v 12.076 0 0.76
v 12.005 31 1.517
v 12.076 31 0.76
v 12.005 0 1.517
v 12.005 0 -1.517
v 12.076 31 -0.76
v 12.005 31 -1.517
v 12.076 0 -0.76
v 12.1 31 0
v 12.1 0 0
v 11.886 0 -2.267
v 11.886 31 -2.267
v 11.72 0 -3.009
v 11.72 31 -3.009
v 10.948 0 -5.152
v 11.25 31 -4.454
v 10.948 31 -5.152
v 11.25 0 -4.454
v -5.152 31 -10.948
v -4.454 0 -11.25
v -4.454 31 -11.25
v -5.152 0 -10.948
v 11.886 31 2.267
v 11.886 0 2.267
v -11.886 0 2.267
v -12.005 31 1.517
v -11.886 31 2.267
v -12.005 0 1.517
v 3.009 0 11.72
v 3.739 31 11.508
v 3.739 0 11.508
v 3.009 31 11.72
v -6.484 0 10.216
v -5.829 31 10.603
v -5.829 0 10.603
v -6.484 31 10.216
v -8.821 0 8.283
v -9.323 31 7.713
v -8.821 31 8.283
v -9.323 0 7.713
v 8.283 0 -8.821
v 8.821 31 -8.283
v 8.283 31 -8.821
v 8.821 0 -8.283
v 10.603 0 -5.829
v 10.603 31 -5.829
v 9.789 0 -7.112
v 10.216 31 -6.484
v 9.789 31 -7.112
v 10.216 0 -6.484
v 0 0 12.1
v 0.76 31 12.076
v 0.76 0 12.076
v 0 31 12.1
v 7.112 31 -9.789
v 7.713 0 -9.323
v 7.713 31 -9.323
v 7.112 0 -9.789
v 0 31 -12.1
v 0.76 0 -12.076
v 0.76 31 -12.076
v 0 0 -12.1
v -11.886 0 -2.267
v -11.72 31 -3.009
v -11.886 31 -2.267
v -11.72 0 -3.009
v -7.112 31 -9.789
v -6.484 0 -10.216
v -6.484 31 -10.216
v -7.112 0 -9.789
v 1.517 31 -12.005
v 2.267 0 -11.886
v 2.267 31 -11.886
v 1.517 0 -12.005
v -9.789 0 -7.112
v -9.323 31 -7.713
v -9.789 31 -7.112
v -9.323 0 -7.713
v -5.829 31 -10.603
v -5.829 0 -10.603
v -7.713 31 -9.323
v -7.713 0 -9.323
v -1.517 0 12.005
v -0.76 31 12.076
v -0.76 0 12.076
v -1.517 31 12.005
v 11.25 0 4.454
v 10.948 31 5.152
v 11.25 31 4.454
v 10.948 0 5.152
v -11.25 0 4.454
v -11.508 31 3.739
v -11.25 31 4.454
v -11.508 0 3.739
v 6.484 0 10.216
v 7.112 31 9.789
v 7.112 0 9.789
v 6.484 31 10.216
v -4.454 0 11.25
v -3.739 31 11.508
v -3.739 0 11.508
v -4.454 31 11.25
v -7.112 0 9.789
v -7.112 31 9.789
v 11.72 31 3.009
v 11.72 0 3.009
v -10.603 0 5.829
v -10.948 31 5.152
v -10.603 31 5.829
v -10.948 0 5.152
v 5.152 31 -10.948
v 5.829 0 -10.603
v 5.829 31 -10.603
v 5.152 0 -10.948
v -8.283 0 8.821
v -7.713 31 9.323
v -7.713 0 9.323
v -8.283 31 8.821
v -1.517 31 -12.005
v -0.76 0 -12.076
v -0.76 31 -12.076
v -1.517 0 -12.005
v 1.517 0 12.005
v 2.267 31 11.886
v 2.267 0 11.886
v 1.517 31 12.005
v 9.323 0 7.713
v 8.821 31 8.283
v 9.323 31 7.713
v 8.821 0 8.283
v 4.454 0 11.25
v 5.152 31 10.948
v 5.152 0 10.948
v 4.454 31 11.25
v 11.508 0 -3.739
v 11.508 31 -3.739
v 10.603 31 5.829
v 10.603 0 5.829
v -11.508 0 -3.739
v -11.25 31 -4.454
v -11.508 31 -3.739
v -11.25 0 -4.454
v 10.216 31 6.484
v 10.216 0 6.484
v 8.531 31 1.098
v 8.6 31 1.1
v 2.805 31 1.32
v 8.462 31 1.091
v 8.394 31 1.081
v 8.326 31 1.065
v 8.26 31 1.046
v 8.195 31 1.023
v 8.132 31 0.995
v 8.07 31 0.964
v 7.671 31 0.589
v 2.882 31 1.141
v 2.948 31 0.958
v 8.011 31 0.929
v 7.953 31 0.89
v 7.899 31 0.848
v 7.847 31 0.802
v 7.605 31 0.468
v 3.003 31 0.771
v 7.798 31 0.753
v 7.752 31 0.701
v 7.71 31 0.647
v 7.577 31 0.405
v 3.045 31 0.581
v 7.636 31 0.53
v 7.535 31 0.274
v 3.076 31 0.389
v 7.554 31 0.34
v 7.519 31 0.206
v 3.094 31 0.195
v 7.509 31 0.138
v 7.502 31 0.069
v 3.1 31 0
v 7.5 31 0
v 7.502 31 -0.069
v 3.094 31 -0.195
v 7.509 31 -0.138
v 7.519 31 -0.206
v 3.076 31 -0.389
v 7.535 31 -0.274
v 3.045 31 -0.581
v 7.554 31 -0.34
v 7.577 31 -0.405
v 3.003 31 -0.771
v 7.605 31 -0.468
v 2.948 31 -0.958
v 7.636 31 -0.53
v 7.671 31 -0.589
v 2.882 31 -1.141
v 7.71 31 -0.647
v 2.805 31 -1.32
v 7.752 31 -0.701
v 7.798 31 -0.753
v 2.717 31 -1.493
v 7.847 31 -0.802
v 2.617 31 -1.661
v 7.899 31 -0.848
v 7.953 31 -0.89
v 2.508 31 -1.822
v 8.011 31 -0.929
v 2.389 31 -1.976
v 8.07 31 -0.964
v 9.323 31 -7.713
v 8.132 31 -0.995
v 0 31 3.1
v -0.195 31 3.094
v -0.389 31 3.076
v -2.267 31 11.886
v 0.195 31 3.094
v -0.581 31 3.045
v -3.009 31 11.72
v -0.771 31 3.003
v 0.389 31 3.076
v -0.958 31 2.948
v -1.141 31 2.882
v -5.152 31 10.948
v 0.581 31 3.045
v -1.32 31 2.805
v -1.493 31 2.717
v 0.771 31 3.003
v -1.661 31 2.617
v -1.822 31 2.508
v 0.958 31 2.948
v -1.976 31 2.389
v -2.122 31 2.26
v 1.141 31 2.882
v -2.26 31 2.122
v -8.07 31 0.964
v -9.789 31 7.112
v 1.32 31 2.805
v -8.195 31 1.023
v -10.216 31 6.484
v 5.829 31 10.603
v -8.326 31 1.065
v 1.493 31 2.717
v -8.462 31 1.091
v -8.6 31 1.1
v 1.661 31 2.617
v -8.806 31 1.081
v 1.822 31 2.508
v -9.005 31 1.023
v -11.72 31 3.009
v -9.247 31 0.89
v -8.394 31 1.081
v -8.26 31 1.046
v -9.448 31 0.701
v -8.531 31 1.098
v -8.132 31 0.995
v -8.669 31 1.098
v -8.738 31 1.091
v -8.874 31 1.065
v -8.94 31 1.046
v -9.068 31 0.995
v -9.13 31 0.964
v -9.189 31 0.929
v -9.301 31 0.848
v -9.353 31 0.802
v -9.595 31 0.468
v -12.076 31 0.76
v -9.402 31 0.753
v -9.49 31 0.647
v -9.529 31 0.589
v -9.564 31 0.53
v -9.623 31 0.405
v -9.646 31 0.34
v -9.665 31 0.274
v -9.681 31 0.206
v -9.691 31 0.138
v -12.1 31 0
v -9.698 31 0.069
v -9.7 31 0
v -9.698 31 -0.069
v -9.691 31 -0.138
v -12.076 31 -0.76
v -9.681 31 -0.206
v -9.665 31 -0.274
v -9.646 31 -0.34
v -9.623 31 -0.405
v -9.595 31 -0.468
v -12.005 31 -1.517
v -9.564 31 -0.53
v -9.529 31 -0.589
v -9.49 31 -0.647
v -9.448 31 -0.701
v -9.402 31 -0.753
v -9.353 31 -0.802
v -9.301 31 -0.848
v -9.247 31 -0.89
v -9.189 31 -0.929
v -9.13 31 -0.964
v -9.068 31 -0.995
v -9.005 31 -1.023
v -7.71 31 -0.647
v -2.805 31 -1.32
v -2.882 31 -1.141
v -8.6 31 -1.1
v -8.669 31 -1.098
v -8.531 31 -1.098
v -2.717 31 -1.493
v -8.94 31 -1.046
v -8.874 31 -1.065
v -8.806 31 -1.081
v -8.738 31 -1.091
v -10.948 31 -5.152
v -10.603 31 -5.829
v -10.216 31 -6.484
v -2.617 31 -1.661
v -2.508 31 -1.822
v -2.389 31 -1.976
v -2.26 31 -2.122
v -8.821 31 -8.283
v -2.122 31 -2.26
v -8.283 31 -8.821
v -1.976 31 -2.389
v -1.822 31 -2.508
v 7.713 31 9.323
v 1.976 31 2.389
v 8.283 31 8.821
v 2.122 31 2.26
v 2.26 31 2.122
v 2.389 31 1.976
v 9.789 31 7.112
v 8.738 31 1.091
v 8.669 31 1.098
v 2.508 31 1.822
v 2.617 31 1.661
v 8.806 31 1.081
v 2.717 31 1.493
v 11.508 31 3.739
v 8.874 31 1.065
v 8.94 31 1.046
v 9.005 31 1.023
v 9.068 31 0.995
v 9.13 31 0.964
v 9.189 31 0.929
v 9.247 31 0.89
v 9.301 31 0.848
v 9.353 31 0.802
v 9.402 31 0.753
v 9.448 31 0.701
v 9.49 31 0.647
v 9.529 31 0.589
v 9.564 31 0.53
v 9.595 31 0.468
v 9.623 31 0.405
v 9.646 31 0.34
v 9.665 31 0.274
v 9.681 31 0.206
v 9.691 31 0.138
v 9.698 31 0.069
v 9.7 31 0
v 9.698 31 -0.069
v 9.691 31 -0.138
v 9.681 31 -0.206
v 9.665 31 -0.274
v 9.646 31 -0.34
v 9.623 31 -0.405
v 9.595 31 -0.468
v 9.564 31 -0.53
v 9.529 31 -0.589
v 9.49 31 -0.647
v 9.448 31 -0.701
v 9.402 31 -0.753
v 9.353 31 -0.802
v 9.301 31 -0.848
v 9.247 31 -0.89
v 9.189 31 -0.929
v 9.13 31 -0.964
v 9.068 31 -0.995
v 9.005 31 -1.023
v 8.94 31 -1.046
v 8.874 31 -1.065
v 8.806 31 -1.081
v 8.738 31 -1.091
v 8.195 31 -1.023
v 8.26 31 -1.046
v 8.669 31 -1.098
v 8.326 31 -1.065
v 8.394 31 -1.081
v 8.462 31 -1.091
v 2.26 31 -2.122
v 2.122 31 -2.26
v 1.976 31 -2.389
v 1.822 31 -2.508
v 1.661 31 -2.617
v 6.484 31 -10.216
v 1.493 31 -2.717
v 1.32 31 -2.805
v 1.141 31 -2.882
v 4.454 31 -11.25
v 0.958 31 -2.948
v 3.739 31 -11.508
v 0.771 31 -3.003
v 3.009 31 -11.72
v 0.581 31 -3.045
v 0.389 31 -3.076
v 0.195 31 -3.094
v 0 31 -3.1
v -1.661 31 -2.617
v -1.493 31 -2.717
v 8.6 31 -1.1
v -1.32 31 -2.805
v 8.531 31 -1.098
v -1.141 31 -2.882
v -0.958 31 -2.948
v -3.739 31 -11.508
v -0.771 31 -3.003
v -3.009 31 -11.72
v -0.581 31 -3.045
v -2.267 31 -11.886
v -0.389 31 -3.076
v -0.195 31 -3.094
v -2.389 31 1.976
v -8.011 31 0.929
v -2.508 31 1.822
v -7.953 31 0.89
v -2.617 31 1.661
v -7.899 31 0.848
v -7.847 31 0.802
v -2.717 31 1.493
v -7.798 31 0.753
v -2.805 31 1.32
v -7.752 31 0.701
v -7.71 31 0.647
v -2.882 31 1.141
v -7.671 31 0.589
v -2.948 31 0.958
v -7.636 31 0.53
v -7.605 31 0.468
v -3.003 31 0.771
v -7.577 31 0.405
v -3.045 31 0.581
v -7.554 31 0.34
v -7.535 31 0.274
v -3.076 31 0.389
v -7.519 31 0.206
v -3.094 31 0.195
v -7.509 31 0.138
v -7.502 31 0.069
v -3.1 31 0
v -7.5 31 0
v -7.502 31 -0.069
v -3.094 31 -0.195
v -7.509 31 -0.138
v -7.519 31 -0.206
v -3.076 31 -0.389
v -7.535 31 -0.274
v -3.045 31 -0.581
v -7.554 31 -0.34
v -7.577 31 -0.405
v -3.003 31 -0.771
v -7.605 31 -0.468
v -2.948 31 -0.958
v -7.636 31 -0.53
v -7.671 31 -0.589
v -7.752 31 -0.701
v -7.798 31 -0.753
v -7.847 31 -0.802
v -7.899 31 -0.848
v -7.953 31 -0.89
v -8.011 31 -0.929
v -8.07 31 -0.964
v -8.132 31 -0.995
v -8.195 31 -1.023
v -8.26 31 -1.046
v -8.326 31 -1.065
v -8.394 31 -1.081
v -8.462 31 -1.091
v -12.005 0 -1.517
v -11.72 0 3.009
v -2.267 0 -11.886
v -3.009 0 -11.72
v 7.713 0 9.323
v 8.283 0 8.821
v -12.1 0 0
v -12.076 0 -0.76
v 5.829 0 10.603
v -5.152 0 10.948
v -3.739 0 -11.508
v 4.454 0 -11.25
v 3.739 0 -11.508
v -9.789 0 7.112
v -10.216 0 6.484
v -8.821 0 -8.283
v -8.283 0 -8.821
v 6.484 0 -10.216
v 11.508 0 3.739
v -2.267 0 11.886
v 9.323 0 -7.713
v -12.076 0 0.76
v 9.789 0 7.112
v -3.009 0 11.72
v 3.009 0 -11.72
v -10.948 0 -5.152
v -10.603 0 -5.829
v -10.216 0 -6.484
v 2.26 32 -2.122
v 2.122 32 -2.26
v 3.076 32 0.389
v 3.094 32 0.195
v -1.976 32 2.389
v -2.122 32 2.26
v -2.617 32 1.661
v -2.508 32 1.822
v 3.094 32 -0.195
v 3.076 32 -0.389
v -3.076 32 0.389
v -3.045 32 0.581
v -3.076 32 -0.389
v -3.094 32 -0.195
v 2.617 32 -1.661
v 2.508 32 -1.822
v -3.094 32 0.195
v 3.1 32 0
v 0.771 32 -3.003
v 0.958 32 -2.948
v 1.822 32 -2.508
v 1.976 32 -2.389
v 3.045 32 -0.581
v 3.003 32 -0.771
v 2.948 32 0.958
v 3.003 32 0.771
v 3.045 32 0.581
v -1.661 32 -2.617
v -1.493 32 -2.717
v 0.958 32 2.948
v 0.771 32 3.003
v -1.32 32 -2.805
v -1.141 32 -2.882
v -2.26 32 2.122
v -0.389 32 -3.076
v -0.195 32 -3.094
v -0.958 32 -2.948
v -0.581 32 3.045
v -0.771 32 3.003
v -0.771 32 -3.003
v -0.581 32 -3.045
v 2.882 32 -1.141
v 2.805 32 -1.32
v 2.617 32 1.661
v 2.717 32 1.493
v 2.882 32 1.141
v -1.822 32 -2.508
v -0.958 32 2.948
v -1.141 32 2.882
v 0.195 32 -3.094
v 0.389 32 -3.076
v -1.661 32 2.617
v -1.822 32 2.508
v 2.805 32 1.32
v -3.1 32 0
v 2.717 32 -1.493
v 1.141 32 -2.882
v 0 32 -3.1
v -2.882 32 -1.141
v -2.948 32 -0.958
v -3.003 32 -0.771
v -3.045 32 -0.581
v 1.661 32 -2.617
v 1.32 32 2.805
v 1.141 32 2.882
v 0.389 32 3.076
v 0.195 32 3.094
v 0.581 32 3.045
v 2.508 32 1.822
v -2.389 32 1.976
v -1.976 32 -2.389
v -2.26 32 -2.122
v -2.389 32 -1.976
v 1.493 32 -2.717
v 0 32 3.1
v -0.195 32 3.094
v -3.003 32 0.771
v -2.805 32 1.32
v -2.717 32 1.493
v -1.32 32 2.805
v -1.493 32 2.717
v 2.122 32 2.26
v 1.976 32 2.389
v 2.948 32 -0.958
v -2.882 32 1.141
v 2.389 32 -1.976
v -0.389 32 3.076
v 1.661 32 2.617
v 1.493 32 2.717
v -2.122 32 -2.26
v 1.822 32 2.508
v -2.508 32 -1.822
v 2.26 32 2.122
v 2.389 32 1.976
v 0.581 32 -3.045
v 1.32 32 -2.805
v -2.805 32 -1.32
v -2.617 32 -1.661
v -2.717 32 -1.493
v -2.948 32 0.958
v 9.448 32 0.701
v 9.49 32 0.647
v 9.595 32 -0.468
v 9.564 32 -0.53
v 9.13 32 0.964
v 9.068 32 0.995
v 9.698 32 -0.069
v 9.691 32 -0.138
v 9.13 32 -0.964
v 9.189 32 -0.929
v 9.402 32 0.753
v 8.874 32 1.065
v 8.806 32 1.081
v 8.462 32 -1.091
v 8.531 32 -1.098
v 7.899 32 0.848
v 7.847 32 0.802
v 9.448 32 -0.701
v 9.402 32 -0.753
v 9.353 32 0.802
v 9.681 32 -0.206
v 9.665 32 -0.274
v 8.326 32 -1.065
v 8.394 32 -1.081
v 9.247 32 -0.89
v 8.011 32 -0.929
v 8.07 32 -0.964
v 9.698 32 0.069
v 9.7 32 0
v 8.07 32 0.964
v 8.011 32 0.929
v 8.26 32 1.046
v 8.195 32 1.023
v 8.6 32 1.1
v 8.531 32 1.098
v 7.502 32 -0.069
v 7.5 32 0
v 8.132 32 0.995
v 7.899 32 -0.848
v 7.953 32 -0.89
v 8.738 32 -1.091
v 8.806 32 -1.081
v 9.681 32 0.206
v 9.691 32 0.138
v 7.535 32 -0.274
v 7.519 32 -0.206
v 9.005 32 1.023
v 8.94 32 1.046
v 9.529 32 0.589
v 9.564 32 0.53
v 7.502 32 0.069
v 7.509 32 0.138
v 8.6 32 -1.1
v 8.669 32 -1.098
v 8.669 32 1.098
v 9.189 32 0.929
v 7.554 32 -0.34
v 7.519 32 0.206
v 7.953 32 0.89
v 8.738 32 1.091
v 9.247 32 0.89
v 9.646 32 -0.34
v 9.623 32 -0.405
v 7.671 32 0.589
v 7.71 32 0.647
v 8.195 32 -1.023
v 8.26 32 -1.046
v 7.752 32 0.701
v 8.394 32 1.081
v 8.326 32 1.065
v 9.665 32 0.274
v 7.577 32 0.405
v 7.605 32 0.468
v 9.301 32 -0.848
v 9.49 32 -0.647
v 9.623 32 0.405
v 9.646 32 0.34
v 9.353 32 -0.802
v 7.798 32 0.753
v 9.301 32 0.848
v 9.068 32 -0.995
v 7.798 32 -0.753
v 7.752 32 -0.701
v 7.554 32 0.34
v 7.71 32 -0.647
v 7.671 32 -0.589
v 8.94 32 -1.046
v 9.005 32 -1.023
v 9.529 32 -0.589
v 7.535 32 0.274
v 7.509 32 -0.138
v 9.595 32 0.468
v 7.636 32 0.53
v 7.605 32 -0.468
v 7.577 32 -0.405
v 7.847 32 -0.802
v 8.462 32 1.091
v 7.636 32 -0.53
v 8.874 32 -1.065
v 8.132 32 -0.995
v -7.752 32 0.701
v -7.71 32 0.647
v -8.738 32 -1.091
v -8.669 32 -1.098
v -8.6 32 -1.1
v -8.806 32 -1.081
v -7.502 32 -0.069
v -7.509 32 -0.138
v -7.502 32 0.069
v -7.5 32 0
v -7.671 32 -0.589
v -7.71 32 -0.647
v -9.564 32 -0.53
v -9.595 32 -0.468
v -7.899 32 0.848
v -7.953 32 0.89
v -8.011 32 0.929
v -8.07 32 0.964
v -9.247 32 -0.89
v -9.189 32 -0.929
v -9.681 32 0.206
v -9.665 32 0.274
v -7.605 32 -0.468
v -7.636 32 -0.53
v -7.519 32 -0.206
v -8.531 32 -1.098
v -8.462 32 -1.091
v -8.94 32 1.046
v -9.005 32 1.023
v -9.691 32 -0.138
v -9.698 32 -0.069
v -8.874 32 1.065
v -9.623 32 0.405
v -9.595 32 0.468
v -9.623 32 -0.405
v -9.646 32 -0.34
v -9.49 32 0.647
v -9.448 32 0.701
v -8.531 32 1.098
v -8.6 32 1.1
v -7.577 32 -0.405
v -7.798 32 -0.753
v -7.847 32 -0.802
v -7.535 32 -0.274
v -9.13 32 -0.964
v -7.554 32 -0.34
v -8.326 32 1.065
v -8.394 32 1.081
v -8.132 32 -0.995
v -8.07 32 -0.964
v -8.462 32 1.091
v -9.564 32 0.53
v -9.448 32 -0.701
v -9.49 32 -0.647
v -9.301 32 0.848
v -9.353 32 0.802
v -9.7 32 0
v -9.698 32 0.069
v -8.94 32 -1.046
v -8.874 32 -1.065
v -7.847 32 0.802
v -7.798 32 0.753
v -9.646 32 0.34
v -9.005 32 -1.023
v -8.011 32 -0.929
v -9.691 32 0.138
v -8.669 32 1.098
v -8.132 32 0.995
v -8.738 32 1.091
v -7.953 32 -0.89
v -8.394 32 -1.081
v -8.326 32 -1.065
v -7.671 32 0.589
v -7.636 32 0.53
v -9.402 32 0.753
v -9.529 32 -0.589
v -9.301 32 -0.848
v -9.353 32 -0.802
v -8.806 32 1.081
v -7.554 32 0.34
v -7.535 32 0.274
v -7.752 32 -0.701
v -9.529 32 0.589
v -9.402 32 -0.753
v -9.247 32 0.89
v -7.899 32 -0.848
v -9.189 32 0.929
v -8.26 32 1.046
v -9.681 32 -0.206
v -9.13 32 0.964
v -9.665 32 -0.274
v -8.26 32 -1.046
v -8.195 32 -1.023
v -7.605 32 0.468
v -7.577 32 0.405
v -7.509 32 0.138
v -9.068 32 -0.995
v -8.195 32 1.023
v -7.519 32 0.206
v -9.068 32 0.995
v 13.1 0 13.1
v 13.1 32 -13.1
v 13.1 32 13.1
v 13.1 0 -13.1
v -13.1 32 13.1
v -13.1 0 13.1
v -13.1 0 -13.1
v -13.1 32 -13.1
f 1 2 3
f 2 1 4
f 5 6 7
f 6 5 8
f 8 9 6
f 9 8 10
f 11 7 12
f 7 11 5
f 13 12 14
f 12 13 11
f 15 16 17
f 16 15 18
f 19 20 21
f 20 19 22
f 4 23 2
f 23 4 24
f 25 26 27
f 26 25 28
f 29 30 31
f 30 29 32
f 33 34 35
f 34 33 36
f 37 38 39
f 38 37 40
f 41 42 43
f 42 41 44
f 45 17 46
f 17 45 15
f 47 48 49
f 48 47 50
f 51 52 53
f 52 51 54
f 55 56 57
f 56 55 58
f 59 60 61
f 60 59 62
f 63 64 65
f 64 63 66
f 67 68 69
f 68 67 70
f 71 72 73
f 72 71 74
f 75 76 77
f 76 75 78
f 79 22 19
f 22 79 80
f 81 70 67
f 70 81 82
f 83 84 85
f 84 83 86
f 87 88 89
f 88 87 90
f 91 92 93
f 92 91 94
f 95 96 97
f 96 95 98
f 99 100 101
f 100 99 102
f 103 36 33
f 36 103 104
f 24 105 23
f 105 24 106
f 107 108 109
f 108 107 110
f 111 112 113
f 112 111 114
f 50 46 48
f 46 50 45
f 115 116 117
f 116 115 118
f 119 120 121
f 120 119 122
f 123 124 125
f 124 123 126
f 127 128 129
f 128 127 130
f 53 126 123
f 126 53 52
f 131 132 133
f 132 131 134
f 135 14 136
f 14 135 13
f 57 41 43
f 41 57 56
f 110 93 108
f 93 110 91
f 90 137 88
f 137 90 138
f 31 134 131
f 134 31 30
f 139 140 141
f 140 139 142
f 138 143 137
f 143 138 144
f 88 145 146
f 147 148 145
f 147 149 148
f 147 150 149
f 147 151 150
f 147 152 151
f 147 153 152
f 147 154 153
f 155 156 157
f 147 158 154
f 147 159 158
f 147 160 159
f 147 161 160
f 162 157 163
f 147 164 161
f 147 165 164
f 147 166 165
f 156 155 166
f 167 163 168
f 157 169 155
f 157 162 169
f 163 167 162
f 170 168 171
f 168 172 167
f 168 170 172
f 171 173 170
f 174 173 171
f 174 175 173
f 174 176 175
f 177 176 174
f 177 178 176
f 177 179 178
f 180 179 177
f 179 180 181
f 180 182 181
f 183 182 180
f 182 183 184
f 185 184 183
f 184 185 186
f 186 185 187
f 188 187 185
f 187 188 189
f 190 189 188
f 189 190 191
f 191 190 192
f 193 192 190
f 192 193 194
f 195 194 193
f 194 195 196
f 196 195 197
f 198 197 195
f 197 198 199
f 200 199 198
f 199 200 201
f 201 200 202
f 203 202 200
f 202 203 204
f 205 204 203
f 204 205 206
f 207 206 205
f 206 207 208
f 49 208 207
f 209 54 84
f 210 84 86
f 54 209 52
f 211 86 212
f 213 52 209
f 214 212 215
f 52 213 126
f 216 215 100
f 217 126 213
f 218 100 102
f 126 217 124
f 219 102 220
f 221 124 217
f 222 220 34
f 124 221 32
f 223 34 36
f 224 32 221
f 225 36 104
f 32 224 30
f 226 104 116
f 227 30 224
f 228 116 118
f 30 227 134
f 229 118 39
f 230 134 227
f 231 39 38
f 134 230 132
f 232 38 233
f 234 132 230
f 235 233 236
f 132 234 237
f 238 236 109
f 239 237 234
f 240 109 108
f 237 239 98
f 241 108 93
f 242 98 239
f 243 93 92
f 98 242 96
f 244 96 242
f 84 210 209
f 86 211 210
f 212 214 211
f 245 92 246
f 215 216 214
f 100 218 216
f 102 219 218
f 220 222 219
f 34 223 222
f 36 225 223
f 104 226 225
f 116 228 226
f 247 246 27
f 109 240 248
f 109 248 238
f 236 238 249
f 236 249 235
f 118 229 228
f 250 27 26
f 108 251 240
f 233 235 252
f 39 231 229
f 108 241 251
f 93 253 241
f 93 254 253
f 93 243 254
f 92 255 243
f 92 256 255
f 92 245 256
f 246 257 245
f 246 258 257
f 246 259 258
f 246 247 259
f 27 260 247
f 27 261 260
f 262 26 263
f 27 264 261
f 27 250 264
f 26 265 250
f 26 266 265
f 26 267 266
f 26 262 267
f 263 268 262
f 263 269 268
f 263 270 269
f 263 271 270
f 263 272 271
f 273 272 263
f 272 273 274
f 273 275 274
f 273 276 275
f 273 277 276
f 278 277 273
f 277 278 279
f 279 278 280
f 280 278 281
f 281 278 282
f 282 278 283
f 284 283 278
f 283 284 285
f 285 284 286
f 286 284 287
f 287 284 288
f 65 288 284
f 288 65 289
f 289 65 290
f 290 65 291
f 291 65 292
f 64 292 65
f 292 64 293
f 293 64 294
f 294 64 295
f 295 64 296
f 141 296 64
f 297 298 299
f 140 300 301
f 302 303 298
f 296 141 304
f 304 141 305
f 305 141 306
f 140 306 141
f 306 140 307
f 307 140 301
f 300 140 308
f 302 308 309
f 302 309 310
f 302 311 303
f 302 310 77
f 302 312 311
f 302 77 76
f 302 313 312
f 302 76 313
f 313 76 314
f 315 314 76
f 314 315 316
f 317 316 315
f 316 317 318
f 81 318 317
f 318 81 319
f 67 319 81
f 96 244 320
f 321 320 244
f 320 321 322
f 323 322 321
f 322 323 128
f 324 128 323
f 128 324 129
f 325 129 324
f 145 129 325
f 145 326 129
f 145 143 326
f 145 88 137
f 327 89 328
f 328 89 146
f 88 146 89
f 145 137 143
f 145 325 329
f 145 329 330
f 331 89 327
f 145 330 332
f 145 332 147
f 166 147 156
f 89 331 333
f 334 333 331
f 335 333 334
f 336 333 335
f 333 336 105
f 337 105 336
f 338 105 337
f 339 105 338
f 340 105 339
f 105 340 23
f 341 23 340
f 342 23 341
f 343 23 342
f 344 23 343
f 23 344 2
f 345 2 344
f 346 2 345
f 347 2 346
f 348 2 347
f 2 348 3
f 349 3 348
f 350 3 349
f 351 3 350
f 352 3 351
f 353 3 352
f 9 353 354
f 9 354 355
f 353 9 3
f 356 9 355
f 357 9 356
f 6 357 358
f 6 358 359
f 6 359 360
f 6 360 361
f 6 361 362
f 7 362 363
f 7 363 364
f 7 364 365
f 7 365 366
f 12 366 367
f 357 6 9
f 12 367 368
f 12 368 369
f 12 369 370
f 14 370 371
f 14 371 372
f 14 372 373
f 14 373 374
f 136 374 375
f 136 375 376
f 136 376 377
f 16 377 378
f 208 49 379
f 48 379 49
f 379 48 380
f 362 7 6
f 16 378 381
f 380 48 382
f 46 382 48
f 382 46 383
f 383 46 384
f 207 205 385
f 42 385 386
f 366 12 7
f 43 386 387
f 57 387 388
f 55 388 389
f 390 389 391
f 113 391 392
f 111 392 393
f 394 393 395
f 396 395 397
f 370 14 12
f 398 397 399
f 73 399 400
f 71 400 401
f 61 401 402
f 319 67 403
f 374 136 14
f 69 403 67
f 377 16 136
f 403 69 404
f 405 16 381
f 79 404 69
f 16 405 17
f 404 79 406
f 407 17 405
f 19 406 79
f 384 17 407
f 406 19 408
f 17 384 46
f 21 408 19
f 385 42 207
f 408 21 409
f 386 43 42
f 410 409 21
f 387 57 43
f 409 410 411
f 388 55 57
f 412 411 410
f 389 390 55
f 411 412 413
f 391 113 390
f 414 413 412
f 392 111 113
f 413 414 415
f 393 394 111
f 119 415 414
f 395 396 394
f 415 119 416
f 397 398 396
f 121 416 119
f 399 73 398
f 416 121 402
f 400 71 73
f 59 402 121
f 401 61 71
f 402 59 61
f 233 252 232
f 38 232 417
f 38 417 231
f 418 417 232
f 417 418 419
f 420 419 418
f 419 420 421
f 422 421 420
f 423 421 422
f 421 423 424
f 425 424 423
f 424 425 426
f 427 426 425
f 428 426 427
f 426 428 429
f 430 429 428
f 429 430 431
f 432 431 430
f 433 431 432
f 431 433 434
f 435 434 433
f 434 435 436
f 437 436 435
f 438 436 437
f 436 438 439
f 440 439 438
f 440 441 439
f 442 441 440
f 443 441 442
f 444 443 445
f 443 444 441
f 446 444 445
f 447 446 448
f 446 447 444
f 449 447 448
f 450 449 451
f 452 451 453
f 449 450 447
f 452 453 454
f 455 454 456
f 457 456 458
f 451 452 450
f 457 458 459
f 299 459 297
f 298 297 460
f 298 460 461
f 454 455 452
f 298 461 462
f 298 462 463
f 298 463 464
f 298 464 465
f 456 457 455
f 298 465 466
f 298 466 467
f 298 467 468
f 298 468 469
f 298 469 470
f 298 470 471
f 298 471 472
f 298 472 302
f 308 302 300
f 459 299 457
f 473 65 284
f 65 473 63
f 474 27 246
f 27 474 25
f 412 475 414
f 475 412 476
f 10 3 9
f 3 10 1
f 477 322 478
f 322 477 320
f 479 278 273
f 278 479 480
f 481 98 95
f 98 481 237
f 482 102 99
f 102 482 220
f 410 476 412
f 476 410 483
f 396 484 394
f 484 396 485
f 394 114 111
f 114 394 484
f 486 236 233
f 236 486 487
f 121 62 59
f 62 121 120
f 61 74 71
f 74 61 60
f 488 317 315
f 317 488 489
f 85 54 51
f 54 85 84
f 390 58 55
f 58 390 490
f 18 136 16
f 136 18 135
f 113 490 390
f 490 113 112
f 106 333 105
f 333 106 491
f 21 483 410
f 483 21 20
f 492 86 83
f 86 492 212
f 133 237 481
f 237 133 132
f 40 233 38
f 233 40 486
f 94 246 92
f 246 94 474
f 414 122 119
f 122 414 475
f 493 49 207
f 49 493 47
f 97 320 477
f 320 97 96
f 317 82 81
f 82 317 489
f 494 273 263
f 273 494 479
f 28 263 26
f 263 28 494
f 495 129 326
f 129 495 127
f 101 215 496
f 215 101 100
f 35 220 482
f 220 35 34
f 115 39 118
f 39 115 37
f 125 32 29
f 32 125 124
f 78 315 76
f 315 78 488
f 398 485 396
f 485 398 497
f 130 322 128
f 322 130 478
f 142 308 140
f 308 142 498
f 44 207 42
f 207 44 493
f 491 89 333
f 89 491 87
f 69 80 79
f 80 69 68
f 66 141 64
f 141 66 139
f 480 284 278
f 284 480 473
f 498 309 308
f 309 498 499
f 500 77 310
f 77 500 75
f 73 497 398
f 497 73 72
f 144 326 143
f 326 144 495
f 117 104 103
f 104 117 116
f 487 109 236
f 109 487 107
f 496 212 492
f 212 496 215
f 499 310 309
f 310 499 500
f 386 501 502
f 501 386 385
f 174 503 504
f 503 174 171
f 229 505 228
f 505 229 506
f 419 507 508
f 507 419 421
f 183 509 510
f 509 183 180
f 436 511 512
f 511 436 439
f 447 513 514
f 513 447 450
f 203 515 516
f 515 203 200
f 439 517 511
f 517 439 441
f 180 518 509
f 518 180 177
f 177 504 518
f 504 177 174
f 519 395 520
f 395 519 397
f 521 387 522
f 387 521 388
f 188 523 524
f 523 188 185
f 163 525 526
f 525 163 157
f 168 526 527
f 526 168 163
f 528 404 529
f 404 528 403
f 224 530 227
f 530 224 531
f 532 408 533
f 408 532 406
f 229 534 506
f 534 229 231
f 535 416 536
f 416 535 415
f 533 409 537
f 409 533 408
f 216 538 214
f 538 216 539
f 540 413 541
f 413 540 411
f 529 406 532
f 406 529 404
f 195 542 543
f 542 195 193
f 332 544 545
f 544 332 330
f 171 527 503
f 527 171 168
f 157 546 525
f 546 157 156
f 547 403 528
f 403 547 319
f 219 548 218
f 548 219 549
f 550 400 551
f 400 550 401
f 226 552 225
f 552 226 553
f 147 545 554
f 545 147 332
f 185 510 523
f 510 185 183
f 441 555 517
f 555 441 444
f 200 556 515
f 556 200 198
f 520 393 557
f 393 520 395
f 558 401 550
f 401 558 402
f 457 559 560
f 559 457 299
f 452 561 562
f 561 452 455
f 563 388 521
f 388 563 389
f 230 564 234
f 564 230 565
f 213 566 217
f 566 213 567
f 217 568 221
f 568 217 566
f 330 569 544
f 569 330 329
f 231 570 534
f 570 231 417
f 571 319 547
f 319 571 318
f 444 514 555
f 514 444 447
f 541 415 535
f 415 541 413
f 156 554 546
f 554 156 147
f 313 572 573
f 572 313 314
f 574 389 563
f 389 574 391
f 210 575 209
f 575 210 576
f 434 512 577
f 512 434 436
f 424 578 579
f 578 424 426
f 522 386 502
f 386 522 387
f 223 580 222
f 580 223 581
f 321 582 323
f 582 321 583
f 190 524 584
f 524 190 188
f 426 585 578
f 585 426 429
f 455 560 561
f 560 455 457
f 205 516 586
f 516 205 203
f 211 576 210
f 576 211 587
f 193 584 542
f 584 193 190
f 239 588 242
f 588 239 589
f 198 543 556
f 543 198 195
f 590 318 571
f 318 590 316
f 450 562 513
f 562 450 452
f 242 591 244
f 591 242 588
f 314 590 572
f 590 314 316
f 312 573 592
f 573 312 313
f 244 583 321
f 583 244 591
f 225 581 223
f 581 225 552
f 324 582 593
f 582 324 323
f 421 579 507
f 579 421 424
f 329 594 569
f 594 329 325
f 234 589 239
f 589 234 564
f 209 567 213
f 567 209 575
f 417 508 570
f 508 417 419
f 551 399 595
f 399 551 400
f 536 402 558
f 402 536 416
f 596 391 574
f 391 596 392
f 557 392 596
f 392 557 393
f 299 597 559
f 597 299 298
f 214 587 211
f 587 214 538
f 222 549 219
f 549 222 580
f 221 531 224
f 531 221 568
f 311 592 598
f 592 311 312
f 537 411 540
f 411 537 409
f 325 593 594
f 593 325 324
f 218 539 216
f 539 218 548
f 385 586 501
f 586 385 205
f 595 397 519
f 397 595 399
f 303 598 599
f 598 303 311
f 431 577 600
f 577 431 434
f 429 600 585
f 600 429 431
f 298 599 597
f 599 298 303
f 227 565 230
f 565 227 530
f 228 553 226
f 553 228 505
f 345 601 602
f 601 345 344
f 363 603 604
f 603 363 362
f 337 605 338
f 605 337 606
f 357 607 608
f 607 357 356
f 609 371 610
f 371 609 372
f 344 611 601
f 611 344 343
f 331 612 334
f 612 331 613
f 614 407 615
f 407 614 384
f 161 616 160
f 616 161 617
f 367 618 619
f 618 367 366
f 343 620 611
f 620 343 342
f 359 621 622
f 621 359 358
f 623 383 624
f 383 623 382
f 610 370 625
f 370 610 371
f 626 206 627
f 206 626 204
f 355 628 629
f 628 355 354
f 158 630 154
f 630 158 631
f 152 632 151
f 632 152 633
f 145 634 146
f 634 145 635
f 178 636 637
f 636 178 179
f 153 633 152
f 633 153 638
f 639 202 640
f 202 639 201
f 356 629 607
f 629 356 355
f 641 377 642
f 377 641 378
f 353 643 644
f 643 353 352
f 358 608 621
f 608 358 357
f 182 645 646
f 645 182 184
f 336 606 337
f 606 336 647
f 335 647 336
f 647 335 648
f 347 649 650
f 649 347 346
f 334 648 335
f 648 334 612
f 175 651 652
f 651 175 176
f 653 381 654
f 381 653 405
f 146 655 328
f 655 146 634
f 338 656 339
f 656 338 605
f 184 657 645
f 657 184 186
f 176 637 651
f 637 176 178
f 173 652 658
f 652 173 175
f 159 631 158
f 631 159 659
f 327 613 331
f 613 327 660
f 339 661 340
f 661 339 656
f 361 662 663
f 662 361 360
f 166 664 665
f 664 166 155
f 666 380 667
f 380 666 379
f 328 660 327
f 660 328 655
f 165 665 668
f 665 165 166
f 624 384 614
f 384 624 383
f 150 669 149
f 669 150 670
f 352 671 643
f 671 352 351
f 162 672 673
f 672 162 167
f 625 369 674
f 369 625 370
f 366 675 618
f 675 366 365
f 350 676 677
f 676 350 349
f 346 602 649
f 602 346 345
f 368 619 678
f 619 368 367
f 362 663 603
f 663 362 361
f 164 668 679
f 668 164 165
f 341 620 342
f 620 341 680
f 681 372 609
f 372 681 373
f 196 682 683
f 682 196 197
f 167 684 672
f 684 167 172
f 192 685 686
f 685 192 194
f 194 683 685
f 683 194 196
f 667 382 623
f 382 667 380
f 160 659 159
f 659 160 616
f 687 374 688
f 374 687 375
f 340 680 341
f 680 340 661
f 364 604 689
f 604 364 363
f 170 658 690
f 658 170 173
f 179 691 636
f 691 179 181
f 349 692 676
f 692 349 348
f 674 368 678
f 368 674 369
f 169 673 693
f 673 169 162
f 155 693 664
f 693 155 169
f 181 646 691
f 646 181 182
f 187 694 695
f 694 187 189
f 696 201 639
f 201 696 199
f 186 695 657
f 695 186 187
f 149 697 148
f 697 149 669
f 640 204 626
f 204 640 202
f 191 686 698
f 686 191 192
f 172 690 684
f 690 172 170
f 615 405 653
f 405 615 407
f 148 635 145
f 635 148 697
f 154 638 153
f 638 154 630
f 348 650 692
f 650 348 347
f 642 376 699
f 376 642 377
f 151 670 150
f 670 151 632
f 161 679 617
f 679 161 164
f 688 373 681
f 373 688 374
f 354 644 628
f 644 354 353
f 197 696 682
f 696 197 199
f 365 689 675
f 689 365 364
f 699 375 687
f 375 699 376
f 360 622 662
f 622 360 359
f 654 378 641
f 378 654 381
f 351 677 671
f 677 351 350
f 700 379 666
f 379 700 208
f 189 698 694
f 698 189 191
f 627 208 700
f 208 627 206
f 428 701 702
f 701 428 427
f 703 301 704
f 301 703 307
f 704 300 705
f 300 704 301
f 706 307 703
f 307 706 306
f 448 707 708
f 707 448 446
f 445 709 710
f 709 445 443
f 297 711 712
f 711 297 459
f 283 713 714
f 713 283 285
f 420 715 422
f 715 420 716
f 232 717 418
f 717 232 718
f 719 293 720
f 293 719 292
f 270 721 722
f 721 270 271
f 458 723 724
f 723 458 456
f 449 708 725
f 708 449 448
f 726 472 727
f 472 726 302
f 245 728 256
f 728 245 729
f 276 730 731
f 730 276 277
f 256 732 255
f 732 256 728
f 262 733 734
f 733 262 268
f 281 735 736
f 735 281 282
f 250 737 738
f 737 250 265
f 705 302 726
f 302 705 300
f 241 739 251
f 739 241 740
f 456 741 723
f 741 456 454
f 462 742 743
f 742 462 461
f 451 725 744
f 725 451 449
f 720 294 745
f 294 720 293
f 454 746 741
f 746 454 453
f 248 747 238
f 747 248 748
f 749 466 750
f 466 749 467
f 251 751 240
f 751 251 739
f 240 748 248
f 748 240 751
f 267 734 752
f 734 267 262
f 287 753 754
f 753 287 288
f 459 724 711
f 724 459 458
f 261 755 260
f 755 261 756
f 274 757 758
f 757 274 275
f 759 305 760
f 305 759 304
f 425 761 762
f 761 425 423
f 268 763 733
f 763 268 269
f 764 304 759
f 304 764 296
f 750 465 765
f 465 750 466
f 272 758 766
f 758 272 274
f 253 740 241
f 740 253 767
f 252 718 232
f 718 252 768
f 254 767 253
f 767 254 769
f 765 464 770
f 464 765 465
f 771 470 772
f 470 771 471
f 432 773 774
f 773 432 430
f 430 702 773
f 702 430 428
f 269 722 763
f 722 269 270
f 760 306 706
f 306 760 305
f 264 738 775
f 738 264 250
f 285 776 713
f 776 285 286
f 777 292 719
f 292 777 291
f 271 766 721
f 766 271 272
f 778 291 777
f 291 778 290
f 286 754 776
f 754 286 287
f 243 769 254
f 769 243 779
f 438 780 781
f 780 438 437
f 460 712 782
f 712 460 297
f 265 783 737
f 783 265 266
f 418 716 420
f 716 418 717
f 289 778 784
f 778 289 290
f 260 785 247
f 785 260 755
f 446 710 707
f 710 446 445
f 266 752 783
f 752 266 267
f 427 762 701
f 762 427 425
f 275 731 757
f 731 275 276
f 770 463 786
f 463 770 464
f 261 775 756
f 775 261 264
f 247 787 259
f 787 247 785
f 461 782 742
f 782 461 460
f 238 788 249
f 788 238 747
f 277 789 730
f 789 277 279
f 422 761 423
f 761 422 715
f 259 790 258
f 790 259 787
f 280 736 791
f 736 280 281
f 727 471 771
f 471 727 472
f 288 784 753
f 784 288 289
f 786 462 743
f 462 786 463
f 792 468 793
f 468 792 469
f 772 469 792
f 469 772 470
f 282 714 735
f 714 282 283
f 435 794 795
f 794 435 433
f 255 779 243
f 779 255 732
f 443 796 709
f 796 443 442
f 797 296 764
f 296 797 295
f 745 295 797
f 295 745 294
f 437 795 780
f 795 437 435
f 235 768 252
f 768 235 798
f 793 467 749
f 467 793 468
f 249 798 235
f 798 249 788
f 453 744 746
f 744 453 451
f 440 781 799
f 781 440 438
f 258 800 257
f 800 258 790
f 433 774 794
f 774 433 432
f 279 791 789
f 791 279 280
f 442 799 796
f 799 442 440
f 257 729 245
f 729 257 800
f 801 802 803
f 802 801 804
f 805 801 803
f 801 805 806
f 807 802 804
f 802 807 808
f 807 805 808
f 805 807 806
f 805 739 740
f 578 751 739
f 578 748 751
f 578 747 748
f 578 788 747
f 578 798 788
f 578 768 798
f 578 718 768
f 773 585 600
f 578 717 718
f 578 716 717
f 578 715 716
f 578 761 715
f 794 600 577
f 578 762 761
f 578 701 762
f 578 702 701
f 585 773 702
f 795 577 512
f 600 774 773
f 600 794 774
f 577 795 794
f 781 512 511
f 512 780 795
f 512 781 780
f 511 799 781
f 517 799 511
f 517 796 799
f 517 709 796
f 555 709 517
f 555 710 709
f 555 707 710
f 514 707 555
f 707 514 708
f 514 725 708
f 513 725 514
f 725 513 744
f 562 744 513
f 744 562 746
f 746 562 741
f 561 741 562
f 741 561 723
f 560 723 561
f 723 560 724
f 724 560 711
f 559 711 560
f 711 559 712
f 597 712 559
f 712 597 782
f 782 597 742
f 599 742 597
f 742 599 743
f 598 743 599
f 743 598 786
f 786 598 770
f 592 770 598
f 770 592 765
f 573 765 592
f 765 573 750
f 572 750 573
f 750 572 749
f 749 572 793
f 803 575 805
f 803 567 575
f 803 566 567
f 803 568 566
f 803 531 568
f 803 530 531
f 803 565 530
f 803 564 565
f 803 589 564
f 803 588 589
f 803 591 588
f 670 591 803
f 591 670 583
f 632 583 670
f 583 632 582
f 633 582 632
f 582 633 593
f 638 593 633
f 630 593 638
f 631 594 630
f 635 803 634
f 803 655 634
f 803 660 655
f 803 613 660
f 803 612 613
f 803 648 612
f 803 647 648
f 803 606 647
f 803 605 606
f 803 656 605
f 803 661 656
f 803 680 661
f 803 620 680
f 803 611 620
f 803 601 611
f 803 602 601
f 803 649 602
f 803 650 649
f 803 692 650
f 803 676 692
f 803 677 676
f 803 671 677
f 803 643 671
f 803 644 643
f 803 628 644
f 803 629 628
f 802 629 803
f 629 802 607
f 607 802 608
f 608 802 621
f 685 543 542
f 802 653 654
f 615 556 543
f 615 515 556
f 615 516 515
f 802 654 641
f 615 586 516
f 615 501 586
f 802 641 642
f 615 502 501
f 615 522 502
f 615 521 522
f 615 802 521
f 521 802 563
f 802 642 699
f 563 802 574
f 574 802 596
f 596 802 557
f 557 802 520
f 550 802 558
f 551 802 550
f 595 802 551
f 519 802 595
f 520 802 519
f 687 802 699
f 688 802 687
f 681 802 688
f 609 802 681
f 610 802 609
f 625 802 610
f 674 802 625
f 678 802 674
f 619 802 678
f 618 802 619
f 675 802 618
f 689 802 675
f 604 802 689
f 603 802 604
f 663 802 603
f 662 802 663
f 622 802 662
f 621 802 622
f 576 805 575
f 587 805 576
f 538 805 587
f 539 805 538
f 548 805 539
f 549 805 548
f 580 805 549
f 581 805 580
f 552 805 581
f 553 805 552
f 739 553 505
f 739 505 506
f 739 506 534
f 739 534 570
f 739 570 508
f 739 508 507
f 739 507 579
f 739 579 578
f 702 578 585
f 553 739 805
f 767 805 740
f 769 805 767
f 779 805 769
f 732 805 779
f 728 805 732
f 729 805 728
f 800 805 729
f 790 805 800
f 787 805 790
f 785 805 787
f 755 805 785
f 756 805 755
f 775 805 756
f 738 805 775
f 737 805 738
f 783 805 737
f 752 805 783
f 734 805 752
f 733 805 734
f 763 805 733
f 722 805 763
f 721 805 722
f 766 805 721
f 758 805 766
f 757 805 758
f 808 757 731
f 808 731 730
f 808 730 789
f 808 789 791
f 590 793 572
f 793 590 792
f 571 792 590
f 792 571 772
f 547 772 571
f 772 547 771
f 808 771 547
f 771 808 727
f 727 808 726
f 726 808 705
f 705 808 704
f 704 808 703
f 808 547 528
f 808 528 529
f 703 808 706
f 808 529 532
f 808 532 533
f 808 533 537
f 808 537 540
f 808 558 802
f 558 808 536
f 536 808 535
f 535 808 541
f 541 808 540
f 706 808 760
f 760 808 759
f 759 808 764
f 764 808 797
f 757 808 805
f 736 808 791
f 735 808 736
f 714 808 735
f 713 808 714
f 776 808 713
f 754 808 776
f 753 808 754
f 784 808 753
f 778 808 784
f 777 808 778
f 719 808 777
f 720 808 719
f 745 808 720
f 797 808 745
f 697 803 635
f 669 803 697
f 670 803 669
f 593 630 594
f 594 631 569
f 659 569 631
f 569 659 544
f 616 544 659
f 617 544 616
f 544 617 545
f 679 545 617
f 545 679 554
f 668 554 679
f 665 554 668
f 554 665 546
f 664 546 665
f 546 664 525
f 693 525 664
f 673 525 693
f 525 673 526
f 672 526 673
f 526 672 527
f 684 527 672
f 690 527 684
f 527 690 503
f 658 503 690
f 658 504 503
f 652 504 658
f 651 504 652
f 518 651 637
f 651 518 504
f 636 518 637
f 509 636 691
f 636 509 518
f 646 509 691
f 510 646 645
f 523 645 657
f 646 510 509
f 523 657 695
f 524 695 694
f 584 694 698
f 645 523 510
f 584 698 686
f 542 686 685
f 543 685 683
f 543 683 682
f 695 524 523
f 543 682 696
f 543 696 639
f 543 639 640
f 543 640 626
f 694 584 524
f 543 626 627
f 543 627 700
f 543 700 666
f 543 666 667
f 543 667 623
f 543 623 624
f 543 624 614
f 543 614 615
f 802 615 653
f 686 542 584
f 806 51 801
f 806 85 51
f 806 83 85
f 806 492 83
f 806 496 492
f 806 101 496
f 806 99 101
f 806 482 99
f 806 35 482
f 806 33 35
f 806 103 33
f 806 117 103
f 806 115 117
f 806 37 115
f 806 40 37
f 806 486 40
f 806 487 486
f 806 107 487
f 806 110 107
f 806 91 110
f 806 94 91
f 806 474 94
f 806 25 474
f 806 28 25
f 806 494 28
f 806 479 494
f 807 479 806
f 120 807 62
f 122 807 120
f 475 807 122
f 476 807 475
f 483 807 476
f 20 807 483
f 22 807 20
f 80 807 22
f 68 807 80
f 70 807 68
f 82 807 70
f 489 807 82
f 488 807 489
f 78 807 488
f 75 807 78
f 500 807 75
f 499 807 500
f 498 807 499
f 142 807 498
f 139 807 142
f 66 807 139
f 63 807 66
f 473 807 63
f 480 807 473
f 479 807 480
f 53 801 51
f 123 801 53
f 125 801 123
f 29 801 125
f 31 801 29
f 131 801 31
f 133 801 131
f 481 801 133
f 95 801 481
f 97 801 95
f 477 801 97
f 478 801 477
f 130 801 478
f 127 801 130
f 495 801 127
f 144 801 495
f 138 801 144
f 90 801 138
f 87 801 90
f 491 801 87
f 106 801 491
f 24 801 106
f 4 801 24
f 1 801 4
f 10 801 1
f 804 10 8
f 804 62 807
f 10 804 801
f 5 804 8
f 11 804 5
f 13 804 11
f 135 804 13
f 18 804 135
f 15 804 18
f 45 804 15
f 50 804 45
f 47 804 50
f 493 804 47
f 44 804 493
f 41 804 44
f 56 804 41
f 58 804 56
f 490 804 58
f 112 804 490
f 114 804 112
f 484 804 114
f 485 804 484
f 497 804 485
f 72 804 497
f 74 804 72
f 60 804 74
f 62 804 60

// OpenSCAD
//  Measure for smoothness
$fn = 100;

//  Tolerance on the radius
tolerance = 0.1;

motorRadius = 24 / 2;
motorLength = 31;
wallThickness = 1;
cutOutRadius = 6 / 2;
//  Amount of holes for screws
screwMounts = 2;
//  Distance from holes to ax
screwAx = 17.2 / 2;
screwRadius = 2 / 2;

//  Mount opened on the top, 0 for no, 1 for yes
topOpen = 0;    //  [1, 0]

module motorMount(){
    difference(){
        translate(  [   -(motorRadius + wallThickness + tolerance),
                        0,
                        -(motorRadius + wallThickness + tolerance)]){
            cube(   [   2 * (motorRadius + wallThickness + tolerance),
                        motorLength + wallThickness,
                        2 * (motorRadius + wallThickness + tolerance)],
                    center = false);
        }
        if(topOpen == 1){
            translate(  [   -(motorRadius + tolerance),
                            -0.1,
                            0]){
                cube(   [   2 * (motorRadius + tolerance),
                            motorLength + 0.1,
                            2 * (motorRadius + wallThickness + tolerance)],
                        center = false);
            }
        }
        rotate([-90,0,0]){
            translate([0,0,-0.1]){
                cylinder(r = motorRadius + tolerance, h = motorLength + 0.1);
                cylinder(r = cutOutRadius + tolerance, h = motorLength + wallThickness + 0.2);
            }
            for(i = [1:screwMounts]){
                rotate([0,0,360 / screwMounts * i + 90]){
                    translate([0,screwAx,0]){
                        cylinder(r = screwRadius + tolerance, h = motorLength + wallThickness + 0.2);
                    }
                }
            }
        }
    }
}

motorMount();
